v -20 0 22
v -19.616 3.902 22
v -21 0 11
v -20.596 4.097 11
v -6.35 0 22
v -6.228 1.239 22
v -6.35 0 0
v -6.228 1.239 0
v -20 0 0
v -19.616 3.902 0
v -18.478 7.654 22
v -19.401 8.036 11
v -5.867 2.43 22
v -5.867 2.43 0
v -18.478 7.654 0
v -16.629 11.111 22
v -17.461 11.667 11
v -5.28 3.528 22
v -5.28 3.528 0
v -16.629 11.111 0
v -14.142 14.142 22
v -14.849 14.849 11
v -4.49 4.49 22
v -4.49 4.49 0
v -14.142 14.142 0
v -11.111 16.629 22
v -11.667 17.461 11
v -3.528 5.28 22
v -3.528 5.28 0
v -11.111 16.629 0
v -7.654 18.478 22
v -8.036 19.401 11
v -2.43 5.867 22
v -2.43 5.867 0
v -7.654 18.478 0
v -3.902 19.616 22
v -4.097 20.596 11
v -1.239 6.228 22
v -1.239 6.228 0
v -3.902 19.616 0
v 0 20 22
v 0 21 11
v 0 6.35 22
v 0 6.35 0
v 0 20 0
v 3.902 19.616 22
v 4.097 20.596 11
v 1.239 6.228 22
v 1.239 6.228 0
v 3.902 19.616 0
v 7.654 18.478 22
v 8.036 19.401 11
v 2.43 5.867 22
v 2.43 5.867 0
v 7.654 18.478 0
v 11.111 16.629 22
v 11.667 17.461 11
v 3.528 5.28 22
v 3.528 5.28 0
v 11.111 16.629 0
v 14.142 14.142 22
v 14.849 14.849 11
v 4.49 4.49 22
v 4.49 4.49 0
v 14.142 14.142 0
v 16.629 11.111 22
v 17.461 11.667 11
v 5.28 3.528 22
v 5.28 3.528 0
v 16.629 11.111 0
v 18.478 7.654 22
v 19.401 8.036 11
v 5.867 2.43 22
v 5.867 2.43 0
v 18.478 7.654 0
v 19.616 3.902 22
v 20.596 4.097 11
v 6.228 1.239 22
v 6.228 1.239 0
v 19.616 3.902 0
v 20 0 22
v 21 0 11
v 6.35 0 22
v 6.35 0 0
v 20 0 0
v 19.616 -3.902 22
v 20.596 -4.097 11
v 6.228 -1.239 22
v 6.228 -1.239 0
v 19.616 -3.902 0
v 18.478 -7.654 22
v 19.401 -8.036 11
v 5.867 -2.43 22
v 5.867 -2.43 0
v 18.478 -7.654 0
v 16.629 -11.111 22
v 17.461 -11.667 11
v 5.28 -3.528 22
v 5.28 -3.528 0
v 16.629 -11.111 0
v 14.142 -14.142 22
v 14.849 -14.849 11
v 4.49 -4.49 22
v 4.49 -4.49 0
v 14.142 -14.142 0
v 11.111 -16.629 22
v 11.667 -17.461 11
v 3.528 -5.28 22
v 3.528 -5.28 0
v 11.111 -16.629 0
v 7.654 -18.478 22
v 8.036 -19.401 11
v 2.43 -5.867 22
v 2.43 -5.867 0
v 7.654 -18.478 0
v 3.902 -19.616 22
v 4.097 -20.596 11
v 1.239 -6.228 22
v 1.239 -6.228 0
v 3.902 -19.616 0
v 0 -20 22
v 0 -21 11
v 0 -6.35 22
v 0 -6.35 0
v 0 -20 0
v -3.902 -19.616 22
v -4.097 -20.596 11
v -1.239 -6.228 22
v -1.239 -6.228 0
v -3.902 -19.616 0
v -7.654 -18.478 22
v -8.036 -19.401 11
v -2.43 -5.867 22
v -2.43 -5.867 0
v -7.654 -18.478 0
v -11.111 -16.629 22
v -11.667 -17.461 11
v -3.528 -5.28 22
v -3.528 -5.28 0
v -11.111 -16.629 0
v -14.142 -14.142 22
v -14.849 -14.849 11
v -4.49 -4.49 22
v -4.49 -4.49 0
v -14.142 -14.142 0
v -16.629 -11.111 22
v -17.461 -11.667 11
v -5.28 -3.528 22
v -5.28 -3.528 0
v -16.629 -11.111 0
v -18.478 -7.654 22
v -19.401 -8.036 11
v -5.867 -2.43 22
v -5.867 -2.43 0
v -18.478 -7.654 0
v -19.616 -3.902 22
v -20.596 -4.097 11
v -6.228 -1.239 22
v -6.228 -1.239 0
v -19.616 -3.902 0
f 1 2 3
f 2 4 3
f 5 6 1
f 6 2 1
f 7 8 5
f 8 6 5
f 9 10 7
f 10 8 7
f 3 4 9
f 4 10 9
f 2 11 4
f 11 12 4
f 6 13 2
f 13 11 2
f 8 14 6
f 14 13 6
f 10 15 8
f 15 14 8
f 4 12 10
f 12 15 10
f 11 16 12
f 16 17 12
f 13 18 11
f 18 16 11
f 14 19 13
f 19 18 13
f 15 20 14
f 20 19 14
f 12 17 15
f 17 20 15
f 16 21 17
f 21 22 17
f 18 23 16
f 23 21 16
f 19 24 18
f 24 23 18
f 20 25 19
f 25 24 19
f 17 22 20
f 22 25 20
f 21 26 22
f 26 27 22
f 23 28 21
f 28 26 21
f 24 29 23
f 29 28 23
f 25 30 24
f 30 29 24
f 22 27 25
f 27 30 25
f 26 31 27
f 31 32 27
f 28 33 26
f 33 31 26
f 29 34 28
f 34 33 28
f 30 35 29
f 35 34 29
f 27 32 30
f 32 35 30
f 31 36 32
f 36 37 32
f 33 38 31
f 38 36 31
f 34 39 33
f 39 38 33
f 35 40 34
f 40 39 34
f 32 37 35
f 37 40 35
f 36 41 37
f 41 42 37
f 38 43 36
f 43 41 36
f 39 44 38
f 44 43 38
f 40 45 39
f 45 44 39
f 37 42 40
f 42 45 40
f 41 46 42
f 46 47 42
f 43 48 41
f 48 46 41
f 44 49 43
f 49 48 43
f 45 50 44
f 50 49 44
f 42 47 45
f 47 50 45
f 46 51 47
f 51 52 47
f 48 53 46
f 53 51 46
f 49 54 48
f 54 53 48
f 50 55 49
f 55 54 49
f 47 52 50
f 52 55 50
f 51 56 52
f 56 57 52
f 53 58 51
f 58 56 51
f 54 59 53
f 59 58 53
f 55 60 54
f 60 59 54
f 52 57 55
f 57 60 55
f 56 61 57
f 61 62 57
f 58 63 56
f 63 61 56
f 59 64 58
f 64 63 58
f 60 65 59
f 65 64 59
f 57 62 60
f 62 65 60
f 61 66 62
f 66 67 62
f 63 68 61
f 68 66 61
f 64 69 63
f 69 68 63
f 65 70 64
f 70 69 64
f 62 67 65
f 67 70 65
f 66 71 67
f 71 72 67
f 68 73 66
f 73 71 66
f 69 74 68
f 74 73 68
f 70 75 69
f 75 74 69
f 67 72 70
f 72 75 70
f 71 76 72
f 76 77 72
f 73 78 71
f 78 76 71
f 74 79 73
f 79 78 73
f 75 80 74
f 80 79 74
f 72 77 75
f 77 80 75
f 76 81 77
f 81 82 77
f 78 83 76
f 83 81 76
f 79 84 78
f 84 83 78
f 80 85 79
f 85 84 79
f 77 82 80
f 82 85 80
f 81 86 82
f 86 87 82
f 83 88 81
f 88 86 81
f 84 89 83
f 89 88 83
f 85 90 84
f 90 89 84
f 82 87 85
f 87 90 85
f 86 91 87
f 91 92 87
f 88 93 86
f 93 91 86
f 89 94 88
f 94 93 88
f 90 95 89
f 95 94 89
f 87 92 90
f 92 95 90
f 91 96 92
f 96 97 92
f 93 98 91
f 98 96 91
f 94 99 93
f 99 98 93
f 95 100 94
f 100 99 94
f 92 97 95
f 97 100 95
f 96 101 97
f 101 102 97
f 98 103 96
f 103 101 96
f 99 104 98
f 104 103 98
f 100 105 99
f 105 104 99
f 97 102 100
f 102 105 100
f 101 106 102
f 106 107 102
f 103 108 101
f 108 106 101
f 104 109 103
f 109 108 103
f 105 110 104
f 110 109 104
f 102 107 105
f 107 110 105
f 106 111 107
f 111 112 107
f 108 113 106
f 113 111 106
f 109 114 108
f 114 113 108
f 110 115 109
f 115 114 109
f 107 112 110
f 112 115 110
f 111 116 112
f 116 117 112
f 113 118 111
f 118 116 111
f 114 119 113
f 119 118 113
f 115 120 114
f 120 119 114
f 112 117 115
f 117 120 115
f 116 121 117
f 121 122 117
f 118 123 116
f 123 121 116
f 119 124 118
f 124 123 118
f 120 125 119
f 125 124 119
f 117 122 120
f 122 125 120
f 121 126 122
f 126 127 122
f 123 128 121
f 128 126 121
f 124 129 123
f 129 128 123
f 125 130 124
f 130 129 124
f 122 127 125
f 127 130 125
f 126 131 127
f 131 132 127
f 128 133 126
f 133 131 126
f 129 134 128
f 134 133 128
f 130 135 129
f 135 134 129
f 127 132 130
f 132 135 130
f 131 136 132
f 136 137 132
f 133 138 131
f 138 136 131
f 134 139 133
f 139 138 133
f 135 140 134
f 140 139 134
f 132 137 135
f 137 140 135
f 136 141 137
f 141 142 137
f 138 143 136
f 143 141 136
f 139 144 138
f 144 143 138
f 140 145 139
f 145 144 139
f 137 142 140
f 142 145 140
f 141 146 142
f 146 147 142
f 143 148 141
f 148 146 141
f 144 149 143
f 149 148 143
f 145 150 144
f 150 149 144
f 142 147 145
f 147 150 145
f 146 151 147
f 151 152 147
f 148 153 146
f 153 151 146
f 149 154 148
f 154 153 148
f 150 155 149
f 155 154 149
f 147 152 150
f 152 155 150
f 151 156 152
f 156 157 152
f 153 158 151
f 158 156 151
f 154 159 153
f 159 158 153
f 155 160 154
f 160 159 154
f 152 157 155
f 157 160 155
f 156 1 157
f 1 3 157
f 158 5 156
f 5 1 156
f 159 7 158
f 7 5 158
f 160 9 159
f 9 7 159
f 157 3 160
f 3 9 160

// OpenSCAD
$fn = 32;
// ----------------------------------------------------------------------
// Belt roller: 40 mm barrel, 22 mm wide, bore 12.7 mm
// ----------------------------------------------------------------------

// --- parameters (mm) ---
bore_d = 12.7;            // bore
barrel_d = 40;            // barrel diameter
roller_w = 22;            // roller width
crown = 1;                // crown height at mid width

roller_profile = [[6.35, 0], [20, 0], [21, 11], [20, 22], [6.35, 22]];

/* the profile stays clear of the axis, so the bore comes out of the revolve */
rotate_extrude() polygon(roller_profile);
